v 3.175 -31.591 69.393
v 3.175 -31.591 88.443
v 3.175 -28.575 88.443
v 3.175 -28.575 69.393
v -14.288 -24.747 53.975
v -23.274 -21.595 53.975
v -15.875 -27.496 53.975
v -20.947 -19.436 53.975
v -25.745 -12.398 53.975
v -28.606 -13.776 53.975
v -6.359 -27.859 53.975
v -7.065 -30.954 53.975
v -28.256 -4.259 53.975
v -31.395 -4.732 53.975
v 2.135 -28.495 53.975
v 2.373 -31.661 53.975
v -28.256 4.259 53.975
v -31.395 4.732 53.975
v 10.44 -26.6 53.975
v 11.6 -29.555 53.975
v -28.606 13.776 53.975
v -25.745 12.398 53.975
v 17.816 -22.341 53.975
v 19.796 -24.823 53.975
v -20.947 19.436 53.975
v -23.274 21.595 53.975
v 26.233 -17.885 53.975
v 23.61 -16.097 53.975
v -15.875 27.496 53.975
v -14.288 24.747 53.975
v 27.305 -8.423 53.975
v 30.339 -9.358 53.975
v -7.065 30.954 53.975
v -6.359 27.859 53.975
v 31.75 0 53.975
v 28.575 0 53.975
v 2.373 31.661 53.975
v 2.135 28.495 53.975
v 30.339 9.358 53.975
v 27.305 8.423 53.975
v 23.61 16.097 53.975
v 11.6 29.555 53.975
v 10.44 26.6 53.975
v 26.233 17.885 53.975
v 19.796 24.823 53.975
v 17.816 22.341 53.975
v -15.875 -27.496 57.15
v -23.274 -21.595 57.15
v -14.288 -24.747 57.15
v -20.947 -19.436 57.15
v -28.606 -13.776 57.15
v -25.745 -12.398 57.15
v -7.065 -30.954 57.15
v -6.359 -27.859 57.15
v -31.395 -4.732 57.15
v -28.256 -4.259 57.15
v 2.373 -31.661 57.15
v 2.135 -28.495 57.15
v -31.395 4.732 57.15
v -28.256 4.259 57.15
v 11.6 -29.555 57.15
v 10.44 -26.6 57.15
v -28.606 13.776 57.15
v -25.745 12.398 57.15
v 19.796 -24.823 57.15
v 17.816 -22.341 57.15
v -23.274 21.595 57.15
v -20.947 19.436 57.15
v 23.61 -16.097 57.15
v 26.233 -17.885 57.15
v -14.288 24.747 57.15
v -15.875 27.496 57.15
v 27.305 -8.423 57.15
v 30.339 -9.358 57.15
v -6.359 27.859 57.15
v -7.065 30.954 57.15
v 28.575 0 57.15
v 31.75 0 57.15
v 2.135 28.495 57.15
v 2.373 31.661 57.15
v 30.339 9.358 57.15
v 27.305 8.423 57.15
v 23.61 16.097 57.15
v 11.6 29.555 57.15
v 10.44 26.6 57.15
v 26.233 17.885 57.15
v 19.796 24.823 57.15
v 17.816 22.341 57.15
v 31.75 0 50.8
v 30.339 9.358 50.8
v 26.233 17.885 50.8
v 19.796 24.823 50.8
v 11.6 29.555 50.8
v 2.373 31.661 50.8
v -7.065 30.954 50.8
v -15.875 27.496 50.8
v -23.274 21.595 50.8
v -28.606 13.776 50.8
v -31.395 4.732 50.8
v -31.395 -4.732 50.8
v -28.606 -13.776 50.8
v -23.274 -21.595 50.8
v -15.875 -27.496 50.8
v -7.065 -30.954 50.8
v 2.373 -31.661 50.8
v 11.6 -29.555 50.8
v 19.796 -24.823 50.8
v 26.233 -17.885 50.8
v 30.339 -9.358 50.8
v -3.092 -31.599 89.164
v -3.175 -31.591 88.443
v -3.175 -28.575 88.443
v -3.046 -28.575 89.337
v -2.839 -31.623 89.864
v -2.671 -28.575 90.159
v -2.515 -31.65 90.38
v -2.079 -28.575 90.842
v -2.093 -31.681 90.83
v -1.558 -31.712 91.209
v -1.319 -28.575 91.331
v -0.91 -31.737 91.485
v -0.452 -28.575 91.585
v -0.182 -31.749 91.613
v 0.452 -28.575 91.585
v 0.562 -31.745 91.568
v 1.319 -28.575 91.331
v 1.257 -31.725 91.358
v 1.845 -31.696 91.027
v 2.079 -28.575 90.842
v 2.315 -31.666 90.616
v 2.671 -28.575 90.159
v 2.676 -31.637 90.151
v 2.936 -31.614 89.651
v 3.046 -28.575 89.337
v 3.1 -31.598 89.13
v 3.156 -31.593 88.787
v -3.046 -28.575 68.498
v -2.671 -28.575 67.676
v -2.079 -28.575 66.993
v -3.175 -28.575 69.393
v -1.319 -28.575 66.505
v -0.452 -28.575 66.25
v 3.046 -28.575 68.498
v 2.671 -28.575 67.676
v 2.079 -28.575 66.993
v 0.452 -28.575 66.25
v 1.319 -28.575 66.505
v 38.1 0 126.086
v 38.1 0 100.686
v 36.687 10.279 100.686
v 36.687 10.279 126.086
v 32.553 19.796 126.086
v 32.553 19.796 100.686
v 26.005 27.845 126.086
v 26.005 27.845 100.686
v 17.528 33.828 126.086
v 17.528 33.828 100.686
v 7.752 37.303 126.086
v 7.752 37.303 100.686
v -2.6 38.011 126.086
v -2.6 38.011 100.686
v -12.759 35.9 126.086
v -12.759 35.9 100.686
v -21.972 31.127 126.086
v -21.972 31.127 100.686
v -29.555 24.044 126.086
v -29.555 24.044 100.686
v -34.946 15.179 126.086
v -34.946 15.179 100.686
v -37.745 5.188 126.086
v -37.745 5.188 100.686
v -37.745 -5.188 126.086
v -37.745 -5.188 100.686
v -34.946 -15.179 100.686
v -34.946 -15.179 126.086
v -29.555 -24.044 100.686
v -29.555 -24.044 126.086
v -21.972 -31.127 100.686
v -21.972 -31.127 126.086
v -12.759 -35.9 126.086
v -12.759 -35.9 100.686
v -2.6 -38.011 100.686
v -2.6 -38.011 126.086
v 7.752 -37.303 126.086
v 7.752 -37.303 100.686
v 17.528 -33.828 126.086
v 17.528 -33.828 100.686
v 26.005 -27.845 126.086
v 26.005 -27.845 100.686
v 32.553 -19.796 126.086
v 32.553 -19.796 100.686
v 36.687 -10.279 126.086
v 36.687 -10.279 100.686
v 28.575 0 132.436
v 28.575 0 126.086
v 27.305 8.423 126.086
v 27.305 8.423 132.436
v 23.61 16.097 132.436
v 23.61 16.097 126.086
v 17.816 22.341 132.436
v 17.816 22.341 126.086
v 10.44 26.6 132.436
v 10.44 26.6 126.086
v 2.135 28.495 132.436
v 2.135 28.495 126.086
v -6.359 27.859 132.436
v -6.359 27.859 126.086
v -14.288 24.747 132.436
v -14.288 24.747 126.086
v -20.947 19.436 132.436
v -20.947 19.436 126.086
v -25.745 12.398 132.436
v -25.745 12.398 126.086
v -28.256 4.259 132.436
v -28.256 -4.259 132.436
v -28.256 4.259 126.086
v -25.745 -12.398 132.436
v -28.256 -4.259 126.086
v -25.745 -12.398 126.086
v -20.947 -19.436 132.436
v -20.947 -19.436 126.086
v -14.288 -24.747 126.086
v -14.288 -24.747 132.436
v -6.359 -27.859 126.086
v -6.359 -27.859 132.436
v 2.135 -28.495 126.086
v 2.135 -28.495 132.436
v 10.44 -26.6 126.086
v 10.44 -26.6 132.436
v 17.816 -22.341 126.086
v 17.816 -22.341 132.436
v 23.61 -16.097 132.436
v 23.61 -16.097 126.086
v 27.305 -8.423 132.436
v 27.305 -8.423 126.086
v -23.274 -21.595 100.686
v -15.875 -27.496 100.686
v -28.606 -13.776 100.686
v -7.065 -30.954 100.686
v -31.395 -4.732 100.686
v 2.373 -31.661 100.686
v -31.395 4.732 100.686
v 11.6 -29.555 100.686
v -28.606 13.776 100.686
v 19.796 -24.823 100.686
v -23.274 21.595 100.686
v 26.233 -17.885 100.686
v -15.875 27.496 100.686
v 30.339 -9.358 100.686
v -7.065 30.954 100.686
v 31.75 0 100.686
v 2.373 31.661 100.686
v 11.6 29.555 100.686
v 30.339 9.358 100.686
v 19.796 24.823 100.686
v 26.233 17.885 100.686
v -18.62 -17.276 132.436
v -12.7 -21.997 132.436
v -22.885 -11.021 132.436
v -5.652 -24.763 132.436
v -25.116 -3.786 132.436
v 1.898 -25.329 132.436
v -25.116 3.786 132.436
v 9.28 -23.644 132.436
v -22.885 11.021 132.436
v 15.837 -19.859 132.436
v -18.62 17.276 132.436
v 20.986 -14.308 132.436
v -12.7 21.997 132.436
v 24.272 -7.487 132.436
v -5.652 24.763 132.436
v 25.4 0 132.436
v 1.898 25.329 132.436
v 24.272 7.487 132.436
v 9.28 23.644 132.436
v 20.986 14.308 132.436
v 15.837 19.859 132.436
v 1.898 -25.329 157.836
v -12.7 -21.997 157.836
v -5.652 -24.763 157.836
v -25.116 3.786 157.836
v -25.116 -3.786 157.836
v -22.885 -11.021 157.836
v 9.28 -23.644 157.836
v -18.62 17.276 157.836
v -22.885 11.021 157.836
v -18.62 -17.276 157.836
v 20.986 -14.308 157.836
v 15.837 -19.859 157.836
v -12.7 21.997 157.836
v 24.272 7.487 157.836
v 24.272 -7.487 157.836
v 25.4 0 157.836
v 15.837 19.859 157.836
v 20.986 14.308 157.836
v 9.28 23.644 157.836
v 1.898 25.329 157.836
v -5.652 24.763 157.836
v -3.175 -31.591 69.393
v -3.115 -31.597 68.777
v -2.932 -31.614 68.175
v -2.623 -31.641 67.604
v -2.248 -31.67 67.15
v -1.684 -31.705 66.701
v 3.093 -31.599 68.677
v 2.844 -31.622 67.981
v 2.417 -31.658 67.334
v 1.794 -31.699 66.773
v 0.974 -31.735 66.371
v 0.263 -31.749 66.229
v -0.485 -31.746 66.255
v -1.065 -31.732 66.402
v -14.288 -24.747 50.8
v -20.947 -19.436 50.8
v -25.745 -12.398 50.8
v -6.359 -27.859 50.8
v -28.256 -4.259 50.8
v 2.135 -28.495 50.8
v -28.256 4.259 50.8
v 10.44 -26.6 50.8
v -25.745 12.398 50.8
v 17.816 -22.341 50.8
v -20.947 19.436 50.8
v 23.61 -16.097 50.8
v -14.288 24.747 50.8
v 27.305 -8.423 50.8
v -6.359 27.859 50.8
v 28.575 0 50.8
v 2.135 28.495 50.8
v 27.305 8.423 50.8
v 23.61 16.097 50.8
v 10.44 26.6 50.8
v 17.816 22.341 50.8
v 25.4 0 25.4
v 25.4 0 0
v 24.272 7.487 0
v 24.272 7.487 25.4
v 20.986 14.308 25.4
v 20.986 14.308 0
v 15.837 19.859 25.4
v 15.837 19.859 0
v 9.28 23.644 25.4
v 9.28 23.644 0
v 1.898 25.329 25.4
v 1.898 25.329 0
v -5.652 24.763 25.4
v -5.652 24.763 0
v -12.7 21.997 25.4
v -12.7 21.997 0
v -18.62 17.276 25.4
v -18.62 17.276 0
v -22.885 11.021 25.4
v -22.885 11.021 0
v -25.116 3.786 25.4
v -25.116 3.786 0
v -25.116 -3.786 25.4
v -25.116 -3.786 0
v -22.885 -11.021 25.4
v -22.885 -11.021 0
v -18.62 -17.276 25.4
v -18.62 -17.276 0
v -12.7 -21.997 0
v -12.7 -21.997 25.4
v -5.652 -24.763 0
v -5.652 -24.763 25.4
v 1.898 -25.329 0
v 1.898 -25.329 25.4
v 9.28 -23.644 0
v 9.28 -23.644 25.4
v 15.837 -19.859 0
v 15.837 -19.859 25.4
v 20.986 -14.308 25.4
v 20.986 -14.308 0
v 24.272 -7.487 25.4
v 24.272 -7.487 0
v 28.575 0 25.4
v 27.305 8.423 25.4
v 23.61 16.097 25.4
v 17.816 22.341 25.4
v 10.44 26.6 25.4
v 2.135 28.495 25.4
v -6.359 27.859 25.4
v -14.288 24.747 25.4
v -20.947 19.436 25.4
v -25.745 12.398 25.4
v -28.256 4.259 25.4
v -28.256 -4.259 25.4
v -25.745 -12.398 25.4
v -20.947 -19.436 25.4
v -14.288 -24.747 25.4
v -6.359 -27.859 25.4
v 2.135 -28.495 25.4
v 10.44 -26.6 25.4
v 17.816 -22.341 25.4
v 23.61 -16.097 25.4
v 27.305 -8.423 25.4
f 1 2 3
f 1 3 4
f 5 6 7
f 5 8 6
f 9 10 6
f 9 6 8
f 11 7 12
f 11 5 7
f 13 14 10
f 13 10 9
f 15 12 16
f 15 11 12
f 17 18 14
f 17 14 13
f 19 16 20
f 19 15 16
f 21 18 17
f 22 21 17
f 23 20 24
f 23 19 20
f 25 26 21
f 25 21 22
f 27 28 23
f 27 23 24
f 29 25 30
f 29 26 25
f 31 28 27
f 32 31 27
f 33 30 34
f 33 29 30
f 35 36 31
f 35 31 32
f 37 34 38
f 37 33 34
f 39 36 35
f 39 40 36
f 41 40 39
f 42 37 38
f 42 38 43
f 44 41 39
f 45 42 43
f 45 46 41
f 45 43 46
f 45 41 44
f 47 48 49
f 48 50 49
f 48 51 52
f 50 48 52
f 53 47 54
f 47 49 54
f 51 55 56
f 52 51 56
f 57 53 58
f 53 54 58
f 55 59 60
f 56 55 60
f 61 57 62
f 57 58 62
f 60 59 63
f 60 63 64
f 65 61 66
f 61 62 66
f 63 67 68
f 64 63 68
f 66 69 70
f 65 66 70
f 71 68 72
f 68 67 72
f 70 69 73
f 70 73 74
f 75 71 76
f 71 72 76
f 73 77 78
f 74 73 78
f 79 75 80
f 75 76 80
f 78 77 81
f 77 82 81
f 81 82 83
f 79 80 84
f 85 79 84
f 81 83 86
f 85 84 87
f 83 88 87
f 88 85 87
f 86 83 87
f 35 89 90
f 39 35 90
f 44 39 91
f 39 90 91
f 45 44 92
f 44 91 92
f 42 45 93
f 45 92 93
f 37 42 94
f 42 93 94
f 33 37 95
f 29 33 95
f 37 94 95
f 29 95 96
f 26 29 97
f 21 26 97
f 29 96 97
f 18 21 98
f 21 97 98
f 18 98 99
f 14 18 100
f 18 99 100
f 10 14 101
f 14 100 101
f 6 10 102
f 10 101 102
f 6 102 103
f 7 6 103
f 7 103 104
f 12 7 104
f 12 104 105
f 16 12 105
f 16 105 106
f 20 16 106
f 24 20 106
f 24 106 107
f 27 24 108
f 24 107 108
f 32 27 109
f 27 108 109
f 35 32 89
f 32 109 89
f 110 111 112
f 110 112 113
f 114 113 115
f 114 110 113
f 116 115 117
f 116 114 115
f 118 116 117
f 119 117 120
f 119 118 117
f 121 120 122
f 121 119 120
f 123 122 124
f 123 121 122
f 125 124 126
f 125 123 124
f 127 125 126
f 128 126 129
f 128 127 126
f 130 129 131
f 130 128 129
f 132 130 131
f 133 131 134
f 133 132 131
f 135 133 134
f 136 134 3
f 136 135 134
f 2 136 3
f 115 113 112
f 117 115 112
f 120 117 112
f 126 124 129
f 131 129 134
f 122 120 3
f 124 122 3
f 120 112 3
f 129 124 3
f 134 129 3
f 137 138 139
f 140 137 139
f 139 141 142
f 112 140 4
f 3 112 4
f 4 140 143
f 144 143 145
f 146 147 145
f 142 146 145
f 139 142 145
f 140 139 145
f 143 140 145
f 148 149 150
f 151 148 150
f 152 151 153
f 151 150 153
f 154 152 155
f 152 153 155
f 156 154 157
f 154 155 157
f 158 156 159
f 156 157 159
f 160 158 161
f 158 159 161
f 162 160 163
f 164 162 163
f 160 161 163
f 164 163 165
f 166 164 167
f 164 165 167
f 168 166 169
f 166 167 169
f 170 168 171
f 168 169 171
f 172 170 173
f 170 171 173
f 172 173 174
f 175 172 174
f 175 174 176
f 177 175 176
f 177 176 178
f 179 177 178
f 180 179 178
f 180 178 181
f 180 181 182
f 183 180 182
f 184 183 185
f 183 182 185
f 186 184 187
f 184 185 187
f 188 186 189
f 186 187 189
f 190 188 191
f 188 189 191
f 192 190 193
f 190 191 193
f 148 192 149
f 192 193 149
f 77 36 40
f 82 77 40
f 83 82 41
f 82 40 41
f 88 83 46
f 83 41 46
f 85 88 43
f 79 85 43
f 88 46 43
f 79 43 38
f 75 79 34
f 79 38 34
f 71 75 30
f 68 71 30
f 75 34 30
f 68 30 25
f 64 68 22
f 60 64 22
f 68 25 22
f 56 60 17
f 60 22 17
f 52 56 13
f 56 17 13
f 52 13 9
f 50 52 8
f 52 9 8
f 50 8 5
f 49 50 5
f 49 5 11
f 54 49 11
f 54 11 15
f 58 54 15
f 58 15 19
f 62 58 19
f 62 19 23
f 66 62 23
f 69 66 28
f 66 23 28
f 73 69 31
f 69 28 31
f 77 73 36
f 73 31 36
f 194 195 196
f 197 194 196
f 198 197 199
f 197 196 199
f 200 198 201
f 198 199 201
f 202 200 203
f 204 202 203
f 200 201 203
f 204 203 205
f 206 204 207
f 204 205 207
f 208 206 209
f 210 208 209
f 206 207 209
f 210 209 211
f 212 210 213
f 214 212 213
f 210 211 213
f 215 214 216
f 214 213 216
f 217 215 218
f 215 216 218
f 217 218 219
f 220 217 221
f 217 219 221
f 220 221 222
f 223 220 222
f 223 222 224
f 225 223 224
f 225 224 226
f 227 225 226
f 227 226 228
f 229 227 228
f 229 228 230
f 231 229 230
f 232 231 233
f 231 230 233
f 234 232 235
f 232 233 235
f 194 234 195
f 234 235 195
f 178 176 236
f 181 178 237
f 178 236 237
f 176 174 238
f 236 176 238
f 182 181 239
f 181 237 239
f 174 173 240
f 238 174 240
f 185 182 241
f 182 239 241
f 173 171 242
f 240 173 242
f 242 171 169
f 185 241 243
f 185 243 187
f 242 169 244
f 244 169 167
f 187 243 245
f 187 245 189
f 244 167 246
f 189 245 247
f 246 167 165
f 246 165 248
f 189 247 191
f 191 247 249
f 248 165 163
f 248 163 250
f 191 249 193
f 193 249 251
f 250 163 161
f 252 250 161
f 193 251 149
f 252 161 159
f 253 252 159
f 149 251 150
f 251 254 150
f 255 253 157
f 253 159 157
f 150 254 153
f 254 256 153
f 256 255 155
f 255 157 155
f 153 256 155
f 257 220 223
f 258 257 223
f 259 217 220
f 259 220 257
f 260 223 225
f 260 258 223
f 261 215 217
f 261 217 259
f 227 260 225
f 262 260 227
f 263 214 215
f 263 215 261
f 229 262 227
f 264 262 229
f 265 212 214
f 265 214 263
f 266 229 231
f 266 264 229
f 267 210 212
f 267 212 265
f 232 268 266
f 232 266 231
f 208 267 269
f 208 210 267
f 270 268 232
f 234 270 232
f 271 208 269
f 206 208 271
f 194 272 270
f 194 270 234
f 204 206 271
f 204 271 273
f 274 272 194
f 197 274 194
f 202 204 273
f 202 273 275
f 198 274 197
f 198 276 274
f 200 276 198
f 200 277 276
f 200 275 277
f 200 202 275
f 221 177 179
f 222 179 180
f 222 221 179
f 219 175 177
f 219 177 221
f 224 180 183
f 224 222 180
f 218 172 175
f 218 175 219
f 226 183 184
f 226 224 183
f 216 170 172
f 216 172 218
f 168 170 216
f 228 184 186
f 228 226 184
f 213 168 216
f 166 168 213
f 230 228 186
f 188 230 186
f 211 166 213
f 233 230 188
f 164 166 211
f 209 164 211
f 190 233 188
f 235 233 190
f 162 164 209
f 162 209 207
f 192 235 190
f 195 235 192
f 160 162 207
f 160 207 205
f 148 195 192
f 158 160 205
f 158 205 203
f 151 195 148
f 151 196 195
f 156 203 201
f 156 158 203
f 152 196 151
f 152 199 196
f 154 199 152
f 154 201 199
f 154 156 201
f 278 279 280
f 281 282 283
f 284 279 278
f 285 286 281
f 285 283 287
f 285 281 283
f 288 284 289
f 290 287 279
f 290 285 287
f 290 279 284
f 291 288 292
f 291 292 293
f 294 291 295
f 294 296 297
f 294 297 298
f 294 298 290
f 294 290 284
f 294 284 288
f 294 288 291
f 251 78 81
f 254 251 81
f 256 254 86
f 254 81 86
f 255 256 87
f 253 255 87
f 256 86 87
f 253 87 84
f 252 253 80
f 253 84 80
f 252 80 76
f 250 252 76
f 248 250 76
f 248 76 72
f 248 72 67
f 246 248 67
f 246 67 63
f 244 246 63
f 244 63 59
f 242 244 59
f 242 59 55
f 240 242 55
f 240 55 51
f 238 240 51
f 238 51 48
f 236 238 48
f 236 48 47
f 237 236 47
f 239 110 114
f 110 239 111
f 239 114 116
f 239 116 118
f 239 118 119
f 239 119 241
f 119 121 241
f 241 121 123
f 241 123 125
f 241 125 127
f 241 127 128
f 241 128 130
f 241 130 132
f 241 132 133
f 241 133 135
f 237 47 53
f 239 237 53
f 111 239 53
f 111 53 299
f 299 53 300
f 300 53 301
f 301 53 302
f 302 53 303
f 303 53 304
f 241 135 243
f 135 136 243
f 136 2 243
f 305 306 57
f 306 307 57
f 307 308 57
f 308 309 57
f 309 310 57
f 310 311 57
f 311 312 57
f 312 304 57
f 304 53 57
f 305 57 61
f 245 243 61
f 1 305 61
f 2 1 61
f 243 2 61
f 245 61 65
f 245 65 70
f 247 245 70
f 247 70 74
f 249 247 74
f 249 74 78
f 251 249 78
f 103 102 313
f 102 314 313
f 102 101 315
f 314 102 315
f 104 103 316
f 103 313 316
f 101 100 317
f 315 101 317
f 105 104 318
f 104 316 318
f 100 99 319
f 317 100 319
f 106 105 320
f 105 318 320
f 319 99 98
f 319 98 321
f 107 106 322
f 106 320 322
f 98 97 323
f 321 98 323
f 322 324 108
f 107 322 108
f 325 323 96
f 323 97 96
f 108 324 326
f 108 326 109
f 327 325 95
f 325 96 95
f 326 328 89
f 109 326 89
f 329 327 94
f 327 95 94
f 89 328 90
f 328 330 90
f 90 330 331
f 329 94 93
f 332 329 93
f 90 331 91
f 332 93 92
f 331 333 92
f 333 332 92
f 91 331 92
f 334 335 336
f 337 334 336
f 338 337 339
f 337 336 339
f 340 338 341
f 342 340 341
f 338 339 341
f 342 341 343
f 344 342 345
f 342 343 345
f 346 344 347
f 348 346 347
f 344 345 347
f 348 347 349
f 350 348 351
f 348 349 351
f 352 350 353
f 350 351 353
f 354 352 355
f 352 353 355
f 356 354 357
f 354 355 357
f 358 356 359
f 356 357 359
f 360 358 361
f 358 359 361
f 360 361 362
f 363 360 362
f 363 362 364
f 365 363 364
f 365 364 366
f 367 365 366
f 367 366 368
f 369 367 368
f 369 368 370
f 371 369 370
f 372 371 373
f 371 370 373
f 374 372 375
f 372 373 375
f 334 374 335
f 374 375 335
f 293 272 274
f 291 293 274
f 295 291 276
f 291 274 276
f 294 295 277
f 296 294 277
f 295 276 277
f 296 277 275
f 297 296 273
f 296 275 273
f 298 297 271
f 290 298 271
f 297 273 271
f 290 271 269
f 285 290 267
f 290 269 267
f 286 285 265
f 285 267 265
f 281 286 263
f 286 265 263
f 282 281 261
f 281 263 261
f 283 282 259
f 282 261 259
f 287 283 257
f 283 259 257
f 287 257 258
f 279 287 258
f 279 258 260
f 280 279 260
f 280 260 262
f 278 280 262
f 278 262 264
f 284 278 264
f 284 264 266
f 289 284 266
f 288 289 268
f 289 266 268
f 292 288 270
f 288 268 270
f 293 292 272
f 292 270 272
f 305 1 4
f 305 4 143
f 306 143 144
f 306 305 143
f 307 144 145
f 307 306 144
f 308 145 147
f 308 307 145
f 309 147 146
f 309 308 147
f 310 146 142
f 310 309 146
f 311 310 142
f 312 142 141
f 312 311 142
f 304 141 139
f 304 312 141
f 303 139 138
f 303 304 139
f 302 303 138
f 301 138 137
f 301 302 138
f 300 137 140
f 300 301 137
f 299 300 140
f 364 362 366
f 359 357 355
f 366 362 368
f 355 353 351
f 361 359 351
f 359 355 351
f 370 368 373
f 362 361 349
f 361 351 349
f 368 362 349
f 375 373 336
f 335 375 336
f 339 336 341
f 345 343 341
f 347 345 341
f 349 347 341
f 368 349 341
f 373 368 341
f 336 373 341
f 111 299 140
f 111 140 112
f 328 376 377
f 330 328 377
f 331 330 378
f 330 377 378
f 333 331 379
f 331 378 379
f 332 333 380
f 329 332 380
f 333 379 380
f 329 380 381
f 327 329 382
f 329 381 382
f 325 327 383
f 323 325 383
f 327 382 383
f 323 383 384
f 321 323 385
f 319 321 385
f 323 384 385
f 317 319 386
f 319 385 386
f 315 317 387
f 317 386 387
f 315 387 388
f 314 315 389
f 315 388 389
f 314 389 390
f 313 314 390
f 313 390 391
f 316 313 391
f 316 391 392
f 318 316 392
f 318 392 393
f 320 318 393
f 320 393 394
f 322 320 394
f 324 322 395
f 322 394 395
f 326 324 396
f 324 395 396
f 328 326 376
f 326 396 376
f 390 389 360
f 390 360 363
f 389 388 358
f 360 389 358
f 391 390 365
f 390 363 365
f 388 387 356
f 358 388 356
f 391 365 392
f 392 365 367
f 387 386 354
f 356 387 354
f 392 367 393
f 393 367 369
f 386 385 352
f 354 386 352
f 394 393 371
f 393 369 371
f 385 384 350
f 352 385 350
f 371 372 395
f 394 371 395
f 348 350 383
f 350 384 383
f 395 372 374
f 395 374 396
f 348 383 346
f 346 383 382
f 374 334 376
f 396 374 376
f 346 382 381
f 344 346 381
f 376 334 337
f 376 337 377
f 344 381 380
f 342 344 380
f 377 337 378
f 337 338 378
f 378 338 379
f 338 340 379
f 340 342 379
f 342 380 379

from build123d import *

# Parameters (mm, degrees)
SKETCH2_R           = 25.4
BOSS_EXTRUDE1_DEPTH = 25.4
SKETCH3_R           = 28.575
BOSS_EXTRUDE2_DEPTH = 25.4
SKETCH4_R           = 31.75
BOSS_EXTRUDE3_DEPTH = 3.175
SKETCH5_R           = 28.575
BOSS_EXTRUDE4_DEPTH = 3.175
SKETCH6_R           = 31.75
BOSS_EXTRUDE5_DEPTH = 43.5356
SKETCH7_R           = 38.1
BOSS_EXTRUDE6_DEPTH = 25.4
SKETCH8_R           = 28.575
BOSS_EXTRUDE7_DEPTH = 6.35
SKETCH9_R           = 25.4
BOSS_EXTRUDE8_DEPTH = 25.4
CUT_EXTRUDE1_DEPTH  = 3.175


with BuildPart() as part:
    # Sketch2 → Boss-Extrude1 (new body)
    with BuildSketch(Plane.XY):
        Circle(SKETCH2_R)
    extrude(amount=BOSS_EXTRUDE1_DEPTH)

    # Sketch3 → Boss-Extrude2 (add)
    with BuildSketch(Plane.XY.offset(25.4)):
        Circle(SKETCH3_R)
    extrude(amount=BOSS_EXTRUDE2_DEPTH)

    # Sketch4 → Boss-Extrude3 (add)
    with BuildSketch(Plane.XY.offset(50.8)):
        Circle(SKETCH4_R)
    extrude(amount=BOSS_EXTRUDE3_DEPTH)

    # Sketch5 → Boss-Extrude4 (add)
    with BuildSketch(Plane.XY.offset(53.975)):
        Circle(SKETCH5_R)
    extrude(amount=BOSS_EXTRUDE4_DEPTH)

    # Sketch6 → Boss-Extrude5 (add)
    with BuildSketch(Plane.XY.offset(57.15)):
        Circle(SKETCH6_R)
    extrude(amount=BOSS_EXTRUDE5_DEPTH)

    # Sketch7 → Boss-Extrude6 (add)
    with BuildSketch(Plane.XY.offset(100.6856)):
        Circle(SKETCH7_R)
    extrude(amount=BOSS_EXTRUDE6_DEPTH)

    # Sketch8 → Boss-Extrude7 (add)
    with BuildSketch(Plane.XY.offset(126.0856)):
        Circle(SKETCH8_R)
    extrude(amount=BOSS_EXTRUDE7_DEPTH)

    # Sketch9 → Boss-Extrude8 (add)
    with BuildSketch(Plane.XY.offset(132.4356)):
        Circle(SKETCH9_R)
    extrude(amount=BOSS_EXTRUDE8_DEPTH)

    # Sketch10 → Cut-Extrude1 (cut)
    with BuildSketch(Plane(origin=(0, -31.75, 0), x_dir=(-1, 0, 0), z_dir=(0, -1, 0))):
        with BuildLine():
            Line((3.175, -69.3928), (3.175, -88.4428))
            ThreePointArc((3.175, -88.4428), (0, -91.6178), (-3.175, -88.4428))
            Line((-3.175, -88.4428), (-3.175, -69.3928))
            ThreePointArc((-3.175, -69.3928), (0, -66.2178), (3.175, -69.3928))
        make_face()
    extrude(amount=-CUT_EXTRUDE1_DEPTH, mode=Mode.SUBTRACT)


solid = part.part
